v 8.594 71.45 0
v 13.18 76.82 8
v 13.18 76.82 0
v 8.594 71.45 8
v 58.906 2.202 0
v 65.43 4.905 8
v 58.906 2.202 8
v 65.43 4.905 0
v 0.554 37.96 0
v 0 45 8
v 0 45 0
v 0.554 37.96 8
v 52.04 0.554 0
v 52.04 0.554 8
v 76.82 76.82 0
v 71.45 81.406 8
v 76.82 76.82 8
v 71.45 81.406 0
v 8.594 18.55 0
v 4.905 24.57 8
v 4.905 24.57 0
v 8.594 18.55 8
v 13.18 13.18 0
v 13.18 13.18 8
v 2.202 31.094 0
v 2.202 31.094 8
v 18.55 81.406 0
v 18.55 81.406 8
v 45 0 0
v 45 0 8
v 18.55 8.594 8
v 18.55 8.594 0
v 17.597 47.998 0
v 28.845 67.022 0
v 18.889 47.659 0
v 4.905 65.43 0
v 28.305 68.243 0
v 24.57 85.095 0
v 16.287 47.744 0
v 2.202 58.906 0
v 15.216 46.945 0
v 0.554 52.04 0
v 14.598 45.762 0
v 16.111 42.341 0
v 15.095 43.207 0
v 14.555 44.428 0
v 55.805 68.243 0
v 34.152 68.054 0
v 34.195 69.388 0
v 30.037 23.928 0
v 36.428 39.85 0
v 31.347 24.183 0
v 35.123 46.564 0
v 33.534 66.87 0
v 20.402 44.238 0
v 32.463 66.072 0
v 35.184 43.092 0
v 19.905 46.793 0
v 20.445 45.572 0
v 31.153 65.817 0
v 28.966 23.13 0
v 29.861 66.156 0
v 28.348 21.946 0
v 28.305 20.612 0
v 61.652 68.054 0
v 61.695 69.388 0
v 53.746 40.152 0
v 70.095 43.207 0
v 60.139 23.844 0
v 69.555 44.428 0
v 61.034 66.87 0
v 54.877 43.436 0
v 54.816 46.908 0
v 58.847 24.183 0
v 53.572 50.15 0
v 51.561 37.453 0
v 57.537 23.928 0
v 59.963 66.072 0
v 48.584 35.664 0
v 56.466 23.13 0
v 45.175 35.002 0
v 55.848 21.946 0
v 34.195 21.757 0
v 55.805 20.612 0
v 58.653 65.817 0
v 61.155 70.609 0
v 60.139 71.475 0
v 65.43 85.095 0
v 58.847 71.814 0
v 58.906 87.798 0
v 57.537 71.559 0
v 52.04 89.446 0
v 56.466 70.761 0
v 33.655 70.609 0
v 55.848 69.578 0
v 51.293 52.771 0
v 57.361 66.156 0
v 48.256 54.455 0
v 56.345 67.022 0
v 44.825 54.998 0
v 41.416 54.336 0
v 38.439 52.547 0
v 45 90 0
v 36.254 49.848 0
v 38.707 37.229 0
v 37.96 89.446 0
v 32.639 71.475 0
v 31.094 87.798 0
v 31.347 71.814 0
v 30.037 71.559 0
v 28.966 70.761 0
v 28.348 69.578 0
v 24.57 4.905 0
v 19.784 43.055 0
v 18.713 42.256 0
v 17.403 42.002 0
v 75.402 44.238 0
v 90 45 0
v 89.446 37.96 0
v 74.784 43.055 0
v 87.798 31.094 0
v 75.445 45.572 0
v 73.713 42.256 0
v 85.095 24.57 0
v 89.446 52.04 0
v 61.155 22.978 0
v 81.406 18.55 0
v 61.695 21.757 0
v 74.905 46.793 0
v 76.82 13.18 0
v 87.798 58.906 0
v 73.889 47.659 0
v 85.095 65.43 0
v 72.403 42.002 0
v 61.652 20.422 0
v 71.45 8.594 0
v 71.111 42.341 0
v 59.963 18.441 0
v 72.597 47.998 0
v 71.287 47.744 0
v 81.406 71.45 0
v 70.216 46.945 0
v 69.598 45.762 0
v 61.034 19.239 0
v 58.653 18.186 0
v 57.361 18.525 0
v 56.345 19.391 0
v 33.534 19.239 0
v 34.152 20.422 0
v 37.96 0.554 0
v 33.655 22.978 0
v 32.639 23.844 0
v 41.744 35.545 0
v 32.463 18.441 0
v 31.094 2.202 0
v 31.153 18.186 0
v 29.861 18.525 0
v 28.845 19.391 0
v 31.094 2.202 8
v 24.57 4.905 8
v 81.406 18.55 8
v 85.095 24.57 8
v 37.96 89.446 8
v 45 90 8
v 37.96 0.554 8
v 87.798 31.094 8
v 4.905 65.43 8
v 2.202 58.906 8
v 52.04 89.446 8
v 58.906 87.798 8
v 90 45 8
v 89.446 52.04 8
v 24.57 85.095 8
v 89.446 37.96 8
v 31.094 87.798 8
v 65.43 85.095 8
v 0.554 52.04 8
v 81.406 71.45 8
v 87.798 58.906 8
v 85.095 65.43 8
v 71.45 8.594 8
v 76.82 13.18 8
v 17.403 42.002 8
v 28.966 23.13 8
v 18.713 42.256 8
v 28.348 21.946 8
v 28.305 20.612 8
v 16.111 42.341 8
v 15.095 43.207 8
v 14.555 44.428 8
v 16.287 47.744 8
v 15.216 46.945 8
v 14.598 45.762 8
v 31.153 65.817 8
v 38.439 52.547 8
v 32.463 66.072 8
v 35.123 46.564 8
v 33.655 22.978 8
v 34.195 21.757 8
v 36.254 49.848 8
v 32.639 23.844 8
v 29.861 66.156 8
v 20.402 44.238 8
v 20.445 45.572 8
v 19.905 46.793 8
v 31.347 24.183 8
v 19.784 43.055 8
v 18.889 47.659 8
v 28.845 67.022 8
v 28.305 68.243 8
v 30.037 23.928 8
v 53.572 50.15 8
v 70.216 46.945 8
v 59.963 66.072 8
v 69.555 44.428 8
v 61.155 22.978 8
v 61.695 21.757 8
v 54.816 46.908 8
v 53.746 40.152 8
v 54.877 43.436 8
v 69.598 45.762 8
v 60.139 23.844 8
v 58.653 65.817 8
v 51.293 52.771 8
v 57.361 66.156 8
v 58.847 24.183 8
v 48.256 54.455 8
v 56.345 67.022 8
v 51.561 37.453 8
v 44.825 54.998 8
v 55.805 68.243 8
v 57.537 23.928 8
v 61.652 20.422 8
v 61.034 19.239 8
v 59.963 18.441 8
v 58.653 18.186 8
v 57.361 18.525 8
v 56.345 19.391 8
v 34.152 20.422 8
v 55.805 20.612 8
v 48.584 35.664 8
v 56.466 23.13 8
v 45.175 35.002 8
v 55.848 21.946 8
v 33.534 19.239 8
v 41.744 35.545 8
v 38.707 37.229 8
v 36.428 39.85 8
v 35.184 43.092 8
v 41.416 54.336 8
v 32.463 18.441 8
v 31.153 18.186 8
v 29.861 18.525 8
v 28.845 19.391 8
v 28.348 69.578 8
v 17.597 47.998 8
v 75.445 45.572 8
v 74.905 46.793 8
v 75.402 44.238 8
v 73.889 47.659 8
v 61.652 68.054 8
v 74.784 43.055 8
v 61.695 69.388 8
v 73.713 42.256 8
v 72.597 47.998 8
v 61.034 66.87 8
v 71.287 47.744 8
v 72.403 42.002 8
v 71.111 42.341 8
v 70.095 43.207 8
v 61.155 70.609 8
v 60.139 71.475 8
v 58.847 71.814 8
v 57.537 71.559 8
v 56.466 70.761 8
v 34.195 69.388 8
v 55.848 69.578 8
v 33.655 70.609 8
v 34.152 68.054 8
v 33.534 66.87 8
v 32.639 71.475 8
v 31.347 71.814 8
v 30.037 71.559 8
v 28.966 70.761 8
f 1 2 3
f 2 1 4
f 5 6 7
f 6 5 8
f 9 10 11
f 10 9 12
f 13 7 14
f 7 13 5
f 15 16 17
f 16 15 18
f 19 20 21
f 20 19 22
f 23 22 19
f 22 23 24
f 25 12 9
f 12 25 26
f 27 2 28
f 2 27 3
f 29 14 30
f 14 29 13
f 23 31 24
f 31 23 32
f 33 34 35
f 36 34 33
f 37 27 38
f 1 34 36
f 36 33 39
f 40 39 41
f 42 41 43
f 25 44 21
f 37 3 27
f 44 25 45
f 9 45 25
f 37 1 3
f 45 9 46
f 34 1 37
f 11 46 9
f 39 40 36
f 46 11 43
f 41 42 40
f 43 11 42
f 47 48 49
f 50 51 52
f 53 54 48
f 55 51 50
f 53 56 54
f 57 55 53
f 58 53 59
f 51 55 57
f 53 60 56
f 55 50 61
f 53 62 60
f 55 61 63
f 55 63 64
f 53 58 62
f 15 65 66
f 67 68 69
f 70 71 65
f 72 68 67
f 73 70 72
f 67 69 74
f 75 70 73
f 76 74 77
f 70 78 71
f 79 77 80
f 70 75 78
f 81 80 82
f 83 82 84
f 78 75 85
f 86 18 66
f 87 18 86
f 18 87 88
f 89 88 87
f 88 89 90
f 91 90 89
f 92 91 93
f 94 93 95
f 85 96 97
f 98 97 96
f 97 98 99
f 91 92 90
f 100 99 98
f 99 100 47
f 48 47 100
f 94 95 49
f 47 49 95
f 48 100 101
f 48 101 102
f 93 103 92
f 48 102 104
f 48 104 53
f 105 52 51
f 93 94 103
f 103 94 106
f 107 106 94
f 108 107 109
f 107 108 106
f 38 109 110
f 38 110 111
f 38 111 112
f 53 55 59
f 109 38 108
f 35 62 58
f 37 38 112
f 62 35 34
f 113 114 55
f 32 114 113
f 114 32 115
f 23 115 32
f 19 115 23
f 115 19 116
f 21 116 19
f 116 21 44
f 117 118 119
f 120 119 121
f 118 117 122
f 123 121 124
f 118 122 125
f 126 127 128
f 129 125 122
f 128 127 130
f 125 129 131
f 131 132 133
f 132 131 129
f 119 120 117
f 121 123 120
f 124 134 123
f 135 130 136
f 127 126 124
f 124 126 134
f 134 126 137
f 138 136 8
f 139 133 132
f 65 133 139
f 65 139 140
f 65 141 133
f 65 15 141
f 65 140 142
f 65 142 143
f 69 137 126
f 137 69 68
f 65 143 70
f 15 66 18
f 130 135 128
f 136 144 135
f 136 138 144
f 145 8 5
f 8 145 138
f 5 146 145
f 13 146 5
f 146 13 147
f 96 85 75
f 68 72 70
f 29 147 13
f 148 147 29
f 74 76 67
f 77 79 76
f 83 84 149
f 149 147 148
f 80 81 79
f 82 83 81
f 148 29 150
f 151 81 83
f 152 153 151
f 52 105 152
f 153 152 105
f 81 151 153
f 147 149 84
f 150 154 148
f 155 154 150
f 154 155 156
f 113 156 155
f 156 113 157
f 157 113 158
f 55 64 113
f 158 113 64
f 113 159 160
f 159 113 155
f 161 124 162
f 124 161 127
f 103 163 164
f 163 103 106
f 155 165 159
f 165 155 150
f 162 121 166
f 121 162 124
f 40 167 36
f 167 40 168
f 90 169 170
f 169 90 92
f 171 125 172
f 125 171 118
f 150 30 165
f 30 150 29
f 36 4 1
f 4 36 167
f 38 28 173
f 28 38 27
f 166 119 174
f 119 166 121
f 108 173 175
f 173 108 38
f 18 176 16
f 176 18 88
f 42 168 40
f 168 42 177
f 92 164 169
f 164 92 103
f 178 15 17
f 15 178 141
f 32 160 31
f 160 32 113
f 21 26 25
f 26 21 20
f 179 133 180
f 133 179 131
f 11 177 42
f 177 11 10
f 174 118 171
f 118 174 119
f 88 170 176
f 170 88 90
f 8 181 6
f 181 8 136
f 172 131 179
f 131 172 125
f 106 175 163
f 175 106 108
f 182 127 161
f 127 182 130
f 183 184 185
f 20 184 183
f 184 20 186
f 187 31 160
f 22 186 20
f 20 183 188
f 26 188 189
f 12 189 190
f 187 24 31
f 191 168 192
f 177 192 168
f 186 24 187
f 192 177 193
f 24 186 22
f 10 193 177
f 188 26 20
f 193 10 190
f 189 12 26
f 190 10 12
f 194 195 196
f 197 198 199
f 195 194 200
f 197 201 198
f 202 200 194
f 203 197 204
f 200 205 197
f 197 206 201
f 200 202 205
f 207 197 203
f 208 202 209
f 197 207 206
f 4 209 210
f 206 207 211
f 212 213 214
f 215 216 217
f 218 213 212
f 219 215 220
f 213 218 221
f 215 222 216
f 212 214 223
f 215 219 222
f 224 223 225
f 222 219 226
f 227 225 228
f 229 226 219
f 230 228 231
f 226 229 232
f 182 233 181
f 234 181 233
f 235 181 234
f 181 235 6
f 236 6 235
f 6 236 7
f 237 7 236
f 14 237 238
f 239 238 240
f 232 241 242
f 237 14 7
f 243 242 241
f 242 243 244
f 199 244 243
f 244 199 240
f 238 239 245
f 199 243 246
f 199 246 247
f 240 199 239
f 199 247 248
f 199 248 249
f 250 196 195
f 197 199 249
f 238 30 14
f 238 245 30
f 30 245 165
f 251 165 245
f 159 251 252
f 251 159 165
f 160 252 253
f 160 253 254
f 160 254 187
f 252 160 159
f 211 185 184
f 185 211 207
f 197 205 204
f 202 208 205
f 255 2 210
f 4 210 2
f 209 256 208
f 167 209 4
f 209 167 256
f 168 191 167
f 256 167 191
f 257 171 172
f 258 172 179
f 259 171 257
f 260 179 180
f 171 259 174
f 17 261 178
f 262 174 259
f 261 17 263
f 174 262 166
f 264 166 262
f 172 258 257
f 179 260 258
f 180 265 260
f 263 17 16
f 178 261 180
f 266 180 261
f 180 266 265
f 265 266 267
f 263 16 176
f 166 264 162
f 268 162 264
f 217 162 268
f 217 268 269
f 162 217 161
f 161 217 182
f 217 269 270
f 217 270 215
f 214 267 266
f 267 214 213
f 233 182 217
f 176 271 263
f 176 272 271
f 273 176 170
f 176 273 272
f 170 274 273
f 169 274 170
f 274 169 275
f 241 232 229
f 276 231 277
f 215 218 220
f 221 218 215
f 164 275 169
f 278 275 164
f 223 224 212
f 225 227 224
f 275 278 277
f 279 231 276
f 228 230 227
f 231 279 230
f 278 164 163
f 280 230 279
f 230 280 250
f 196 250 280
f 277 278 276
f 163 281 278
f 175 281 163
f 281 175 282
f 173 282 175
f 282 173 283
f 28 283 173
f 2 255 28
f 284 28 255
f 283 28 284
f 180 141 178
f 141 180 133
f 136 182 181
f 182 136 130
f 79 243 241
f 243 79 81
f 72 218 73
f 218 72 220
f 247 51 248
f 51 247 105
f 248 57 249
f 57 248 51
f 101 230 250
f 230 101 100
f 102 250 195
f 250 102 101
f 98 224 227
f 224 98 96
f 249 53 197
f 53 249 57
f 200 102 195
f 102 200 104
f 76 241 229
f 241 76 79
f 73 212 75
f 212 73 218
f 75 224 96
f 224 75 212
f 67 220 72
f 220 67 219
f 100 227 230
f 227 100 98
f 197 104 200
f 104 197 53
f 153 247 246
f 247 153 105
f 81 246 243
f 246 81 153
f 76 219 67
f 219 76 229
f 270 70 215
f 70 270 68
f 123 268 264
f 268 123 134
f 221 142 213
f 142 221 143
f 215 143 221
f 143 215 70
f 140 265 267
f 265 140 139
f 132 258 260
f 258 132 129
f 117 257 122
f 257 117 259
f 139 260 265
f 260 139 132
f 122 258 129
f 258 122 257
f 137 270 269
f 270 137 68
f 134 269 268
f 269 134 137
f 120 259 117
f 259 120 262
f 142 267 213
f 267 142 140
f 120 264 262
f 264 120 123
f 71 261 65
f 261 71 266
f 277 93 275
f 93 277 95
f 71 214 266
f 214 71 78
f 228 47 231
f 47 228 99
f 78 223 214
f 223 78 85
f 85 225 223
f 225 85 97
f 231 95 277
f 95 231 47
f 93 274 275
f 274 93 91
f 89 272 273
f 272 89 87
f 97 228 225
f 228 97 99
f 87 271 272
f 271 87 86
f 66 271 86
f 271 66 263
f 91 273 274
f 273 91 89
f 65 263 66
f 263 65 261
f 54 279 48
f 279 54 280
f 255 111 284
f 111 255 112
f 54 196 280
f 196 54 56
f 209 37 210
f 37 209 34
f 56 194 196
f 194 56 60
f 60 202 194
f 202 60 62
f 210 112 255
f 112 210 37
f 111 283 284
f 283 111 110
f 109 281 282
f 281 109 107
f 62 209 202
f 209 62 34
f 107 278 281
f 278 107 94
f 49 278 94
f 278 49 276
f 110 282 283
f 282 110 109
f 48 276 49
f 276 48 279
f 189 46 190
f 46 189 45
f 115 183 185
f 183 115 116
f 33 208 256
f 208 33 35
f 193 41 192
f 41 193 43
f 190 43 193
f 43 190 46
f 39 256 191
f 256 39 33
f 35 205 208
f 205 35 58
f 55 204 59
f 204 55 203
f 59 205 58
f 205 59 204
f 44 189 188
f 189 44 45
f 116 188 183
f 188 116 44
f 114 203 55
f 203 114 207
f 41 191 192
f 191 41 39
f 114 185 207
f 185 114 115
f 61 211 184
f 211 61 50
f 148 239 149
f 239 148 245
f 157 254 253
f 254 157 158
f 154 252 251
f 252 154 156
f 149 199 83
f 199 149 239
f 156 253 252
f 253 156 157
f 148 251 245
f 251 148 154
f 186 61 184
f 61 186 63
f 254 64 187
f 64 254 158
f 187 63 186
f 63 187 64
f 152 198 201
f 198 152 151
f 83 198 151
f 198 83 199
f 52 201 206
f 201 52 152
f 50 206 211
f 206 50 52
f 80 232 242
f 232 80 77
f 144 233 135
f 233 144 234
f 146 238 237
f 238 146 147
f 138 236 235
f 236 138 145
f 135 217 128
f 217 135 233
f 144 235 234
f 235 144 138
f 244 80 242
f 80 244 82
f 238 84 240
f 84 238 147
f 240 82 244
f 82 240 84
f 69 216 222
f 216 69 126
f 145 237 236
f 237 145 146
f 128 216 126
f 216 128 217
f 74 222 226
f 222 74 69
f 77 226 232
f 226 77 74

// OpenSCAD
$fn = 32;

// ----------------------------------------------------------------------
// Spacer plate: round flange R45, 6 bolts
// ----------------------------------------------------------------------

// --- parameters (mm) ---
bore_r = 10;              // centre bore radius
bolt_r = 3;               // bolt hole radius
plate_t = 8;              // plate thickness, Z (extrusion height)
flange_r = 45;            // flange radius
n_bolt = 6;               // bolt hole count
ring_r = 27.5;            // bolt circle radius

profile = [[90, 45], [89.446, 52.04], [87.798, 58.906], [85.095, 65.43], [81.406, 71.45], [76.82, 76.82], [71.45, 81.406], [65.43, 85.095], [58.906, 87.798], [52.04, 89.446], [45, 90], [37.96, 89.446], [31.094, 87.798], [24.57, 85.095], [18.55, 81.406], [13.18, 76.82], [8.594, 71.45], [4.905, 65.43], [2.202, 58.906], [0.554, 52.04], [0, 45], [0.554, 37.96], [2.202, 31.094], [4.905, 24.57], [8.594, 18.55], [13.18, 13.18], [18.55, 8.594], [24.57, 4.905], [31.094, 2.202], [37.96, 0.554], [45, 0], [52.04, 0.554], [58.906, 2.202], [65.43, 4.905], [71.45, 8.594], [76.82, 13.18], [81.406, 18.55], [85.095, 24.57], [87.798, 31.094], [89.446, 37.96]];  // primary outline, 40 points, counter clockwise
void_1 = [[54.816, 46.908], [53.572, 50.15], [51.293, 52.771], [48.256, 54.455], [44.825, 54.998], [41.416, 54.336], [38.439, 52.547], [36.254, 49.848], [35.123, 46.564], [35.184, 43.092], [36.428, 39.85], [38.707, 37.229], [41.744, 35.545], [45.175, 35.002], [48.584, 35.664], [51.561, 37.453], [53.746, 40.152], [54.877, 43.436]];  // centre bore, 18 points
void_2 = [[75.445, 45.572], [74.905, 46.793], [73.889, 47.659], [72.597, 47.998], [71.287, 47.744], [70.216, 46.945], [69.598, 45.762], [69.555, 44.428], [70.095, 43.207], [71.111, 42.341], [72.403, 42.002], [73.713, 42.256], [74.784, 43.055], [75.402, 44.238]];  // bolt hole 1, 14 points
void_3 = [[61.695, 69.388], [61.155, 70.609], [60.139, 71.475], [58.847, 71.814], [57.537, 71.559], [56.466, 70.761], [55.848, 69.578], [55.805, 68.243], [56.345, 67.022], [57.361, 66.156], [58.653, 65.817], [59.963, 66.072], [61.034, 66.87], [61.652, 68.054]];  // bolt hole 2, 14 points
void_4 = [[34.195, 69.388], [33.655, 70.609], [32.639, 71.475], [31.347, 71.814], [30.037, 71.559], [28.966, 70.761], [28.348, 69.578], [28.305, 68.243], [28.845, 67.022], [29.861, 66.156], [31.153, 65.817], [32.463, 66.072], [33.534, 66.87], [34.152, 68.054]];  // bolt hole 3, 14 points
void_5 = [[20.445, 45.572], [19.905, 46.793], [18.889, 47.659], [17.597, 47.998], [16.287, 47.744], [15.216, 46.945], [14.598, 45.762], [14.555, 44.428], [15.095, 43.207], [16.111, 42.341], [17.403, 42.002], [18.713, 42.256], [19.784, 43.055], [20.402, 44.238]];  // bolt hole 4, 14 points
void_6 = [[34.195, 21.757], [33.655, 22.978], [32.639, 23.844], [31.347, 24.183], [30.037, 23.928], [28.966, 23.13], [28.348, 21.946], [28.305, 20.612], [28.845, 19.391], [29.861, 18.525], [31.153, 18.186], [32.463, 18.441], [33.534, 19.239], [34.152, 20.422]];  // bolt hole 5, 14 points
void_7 = [[61.695, 21.757], [61.155, 22.978], [60.139, 23.844], [58.847, 24.183], [57.537, 23.928], [56.466, 23.13], [55.848, 21.946], [55.805, 20.612], [56.345, 19.391], [57.361, 18.525], [58.653, 18.186], [59.963, 18.441], [61.034, 19.239], [61.652, 20.422]];  // bolt hole 6, 14 points

// --- the one profile operation ---
difference() {
  linear_extrude(height = plate_t) polygon(points = profile);
  translate([0, 0, -1])
    linear_extrude(height = plate_t + 2) polygon(points = void_1);
  translate([0, 0, -1])
    linear_extrude(height = plate_t + 2) polygon(points = void_2);
  translate([0, 0, -1])
    linear_extrude(height = plate_t + 2) polygon(points = void_3);
  translate([0, 0, -1])
    linear_extrude(height = plate_t + 2) polygon(points = void_4);
  translate([0, 0, -1])
    linear_extrude(height = plate_t + 2) polygon(points = void_5);
  translate([0, 0, -1])
    linear_extrude(height = plate_t + 2) polygon(points = void_6);
  translate([0, 0, -1])
    linear_extrude(height = plate_t + 2) polygon(points = void_7);
}
